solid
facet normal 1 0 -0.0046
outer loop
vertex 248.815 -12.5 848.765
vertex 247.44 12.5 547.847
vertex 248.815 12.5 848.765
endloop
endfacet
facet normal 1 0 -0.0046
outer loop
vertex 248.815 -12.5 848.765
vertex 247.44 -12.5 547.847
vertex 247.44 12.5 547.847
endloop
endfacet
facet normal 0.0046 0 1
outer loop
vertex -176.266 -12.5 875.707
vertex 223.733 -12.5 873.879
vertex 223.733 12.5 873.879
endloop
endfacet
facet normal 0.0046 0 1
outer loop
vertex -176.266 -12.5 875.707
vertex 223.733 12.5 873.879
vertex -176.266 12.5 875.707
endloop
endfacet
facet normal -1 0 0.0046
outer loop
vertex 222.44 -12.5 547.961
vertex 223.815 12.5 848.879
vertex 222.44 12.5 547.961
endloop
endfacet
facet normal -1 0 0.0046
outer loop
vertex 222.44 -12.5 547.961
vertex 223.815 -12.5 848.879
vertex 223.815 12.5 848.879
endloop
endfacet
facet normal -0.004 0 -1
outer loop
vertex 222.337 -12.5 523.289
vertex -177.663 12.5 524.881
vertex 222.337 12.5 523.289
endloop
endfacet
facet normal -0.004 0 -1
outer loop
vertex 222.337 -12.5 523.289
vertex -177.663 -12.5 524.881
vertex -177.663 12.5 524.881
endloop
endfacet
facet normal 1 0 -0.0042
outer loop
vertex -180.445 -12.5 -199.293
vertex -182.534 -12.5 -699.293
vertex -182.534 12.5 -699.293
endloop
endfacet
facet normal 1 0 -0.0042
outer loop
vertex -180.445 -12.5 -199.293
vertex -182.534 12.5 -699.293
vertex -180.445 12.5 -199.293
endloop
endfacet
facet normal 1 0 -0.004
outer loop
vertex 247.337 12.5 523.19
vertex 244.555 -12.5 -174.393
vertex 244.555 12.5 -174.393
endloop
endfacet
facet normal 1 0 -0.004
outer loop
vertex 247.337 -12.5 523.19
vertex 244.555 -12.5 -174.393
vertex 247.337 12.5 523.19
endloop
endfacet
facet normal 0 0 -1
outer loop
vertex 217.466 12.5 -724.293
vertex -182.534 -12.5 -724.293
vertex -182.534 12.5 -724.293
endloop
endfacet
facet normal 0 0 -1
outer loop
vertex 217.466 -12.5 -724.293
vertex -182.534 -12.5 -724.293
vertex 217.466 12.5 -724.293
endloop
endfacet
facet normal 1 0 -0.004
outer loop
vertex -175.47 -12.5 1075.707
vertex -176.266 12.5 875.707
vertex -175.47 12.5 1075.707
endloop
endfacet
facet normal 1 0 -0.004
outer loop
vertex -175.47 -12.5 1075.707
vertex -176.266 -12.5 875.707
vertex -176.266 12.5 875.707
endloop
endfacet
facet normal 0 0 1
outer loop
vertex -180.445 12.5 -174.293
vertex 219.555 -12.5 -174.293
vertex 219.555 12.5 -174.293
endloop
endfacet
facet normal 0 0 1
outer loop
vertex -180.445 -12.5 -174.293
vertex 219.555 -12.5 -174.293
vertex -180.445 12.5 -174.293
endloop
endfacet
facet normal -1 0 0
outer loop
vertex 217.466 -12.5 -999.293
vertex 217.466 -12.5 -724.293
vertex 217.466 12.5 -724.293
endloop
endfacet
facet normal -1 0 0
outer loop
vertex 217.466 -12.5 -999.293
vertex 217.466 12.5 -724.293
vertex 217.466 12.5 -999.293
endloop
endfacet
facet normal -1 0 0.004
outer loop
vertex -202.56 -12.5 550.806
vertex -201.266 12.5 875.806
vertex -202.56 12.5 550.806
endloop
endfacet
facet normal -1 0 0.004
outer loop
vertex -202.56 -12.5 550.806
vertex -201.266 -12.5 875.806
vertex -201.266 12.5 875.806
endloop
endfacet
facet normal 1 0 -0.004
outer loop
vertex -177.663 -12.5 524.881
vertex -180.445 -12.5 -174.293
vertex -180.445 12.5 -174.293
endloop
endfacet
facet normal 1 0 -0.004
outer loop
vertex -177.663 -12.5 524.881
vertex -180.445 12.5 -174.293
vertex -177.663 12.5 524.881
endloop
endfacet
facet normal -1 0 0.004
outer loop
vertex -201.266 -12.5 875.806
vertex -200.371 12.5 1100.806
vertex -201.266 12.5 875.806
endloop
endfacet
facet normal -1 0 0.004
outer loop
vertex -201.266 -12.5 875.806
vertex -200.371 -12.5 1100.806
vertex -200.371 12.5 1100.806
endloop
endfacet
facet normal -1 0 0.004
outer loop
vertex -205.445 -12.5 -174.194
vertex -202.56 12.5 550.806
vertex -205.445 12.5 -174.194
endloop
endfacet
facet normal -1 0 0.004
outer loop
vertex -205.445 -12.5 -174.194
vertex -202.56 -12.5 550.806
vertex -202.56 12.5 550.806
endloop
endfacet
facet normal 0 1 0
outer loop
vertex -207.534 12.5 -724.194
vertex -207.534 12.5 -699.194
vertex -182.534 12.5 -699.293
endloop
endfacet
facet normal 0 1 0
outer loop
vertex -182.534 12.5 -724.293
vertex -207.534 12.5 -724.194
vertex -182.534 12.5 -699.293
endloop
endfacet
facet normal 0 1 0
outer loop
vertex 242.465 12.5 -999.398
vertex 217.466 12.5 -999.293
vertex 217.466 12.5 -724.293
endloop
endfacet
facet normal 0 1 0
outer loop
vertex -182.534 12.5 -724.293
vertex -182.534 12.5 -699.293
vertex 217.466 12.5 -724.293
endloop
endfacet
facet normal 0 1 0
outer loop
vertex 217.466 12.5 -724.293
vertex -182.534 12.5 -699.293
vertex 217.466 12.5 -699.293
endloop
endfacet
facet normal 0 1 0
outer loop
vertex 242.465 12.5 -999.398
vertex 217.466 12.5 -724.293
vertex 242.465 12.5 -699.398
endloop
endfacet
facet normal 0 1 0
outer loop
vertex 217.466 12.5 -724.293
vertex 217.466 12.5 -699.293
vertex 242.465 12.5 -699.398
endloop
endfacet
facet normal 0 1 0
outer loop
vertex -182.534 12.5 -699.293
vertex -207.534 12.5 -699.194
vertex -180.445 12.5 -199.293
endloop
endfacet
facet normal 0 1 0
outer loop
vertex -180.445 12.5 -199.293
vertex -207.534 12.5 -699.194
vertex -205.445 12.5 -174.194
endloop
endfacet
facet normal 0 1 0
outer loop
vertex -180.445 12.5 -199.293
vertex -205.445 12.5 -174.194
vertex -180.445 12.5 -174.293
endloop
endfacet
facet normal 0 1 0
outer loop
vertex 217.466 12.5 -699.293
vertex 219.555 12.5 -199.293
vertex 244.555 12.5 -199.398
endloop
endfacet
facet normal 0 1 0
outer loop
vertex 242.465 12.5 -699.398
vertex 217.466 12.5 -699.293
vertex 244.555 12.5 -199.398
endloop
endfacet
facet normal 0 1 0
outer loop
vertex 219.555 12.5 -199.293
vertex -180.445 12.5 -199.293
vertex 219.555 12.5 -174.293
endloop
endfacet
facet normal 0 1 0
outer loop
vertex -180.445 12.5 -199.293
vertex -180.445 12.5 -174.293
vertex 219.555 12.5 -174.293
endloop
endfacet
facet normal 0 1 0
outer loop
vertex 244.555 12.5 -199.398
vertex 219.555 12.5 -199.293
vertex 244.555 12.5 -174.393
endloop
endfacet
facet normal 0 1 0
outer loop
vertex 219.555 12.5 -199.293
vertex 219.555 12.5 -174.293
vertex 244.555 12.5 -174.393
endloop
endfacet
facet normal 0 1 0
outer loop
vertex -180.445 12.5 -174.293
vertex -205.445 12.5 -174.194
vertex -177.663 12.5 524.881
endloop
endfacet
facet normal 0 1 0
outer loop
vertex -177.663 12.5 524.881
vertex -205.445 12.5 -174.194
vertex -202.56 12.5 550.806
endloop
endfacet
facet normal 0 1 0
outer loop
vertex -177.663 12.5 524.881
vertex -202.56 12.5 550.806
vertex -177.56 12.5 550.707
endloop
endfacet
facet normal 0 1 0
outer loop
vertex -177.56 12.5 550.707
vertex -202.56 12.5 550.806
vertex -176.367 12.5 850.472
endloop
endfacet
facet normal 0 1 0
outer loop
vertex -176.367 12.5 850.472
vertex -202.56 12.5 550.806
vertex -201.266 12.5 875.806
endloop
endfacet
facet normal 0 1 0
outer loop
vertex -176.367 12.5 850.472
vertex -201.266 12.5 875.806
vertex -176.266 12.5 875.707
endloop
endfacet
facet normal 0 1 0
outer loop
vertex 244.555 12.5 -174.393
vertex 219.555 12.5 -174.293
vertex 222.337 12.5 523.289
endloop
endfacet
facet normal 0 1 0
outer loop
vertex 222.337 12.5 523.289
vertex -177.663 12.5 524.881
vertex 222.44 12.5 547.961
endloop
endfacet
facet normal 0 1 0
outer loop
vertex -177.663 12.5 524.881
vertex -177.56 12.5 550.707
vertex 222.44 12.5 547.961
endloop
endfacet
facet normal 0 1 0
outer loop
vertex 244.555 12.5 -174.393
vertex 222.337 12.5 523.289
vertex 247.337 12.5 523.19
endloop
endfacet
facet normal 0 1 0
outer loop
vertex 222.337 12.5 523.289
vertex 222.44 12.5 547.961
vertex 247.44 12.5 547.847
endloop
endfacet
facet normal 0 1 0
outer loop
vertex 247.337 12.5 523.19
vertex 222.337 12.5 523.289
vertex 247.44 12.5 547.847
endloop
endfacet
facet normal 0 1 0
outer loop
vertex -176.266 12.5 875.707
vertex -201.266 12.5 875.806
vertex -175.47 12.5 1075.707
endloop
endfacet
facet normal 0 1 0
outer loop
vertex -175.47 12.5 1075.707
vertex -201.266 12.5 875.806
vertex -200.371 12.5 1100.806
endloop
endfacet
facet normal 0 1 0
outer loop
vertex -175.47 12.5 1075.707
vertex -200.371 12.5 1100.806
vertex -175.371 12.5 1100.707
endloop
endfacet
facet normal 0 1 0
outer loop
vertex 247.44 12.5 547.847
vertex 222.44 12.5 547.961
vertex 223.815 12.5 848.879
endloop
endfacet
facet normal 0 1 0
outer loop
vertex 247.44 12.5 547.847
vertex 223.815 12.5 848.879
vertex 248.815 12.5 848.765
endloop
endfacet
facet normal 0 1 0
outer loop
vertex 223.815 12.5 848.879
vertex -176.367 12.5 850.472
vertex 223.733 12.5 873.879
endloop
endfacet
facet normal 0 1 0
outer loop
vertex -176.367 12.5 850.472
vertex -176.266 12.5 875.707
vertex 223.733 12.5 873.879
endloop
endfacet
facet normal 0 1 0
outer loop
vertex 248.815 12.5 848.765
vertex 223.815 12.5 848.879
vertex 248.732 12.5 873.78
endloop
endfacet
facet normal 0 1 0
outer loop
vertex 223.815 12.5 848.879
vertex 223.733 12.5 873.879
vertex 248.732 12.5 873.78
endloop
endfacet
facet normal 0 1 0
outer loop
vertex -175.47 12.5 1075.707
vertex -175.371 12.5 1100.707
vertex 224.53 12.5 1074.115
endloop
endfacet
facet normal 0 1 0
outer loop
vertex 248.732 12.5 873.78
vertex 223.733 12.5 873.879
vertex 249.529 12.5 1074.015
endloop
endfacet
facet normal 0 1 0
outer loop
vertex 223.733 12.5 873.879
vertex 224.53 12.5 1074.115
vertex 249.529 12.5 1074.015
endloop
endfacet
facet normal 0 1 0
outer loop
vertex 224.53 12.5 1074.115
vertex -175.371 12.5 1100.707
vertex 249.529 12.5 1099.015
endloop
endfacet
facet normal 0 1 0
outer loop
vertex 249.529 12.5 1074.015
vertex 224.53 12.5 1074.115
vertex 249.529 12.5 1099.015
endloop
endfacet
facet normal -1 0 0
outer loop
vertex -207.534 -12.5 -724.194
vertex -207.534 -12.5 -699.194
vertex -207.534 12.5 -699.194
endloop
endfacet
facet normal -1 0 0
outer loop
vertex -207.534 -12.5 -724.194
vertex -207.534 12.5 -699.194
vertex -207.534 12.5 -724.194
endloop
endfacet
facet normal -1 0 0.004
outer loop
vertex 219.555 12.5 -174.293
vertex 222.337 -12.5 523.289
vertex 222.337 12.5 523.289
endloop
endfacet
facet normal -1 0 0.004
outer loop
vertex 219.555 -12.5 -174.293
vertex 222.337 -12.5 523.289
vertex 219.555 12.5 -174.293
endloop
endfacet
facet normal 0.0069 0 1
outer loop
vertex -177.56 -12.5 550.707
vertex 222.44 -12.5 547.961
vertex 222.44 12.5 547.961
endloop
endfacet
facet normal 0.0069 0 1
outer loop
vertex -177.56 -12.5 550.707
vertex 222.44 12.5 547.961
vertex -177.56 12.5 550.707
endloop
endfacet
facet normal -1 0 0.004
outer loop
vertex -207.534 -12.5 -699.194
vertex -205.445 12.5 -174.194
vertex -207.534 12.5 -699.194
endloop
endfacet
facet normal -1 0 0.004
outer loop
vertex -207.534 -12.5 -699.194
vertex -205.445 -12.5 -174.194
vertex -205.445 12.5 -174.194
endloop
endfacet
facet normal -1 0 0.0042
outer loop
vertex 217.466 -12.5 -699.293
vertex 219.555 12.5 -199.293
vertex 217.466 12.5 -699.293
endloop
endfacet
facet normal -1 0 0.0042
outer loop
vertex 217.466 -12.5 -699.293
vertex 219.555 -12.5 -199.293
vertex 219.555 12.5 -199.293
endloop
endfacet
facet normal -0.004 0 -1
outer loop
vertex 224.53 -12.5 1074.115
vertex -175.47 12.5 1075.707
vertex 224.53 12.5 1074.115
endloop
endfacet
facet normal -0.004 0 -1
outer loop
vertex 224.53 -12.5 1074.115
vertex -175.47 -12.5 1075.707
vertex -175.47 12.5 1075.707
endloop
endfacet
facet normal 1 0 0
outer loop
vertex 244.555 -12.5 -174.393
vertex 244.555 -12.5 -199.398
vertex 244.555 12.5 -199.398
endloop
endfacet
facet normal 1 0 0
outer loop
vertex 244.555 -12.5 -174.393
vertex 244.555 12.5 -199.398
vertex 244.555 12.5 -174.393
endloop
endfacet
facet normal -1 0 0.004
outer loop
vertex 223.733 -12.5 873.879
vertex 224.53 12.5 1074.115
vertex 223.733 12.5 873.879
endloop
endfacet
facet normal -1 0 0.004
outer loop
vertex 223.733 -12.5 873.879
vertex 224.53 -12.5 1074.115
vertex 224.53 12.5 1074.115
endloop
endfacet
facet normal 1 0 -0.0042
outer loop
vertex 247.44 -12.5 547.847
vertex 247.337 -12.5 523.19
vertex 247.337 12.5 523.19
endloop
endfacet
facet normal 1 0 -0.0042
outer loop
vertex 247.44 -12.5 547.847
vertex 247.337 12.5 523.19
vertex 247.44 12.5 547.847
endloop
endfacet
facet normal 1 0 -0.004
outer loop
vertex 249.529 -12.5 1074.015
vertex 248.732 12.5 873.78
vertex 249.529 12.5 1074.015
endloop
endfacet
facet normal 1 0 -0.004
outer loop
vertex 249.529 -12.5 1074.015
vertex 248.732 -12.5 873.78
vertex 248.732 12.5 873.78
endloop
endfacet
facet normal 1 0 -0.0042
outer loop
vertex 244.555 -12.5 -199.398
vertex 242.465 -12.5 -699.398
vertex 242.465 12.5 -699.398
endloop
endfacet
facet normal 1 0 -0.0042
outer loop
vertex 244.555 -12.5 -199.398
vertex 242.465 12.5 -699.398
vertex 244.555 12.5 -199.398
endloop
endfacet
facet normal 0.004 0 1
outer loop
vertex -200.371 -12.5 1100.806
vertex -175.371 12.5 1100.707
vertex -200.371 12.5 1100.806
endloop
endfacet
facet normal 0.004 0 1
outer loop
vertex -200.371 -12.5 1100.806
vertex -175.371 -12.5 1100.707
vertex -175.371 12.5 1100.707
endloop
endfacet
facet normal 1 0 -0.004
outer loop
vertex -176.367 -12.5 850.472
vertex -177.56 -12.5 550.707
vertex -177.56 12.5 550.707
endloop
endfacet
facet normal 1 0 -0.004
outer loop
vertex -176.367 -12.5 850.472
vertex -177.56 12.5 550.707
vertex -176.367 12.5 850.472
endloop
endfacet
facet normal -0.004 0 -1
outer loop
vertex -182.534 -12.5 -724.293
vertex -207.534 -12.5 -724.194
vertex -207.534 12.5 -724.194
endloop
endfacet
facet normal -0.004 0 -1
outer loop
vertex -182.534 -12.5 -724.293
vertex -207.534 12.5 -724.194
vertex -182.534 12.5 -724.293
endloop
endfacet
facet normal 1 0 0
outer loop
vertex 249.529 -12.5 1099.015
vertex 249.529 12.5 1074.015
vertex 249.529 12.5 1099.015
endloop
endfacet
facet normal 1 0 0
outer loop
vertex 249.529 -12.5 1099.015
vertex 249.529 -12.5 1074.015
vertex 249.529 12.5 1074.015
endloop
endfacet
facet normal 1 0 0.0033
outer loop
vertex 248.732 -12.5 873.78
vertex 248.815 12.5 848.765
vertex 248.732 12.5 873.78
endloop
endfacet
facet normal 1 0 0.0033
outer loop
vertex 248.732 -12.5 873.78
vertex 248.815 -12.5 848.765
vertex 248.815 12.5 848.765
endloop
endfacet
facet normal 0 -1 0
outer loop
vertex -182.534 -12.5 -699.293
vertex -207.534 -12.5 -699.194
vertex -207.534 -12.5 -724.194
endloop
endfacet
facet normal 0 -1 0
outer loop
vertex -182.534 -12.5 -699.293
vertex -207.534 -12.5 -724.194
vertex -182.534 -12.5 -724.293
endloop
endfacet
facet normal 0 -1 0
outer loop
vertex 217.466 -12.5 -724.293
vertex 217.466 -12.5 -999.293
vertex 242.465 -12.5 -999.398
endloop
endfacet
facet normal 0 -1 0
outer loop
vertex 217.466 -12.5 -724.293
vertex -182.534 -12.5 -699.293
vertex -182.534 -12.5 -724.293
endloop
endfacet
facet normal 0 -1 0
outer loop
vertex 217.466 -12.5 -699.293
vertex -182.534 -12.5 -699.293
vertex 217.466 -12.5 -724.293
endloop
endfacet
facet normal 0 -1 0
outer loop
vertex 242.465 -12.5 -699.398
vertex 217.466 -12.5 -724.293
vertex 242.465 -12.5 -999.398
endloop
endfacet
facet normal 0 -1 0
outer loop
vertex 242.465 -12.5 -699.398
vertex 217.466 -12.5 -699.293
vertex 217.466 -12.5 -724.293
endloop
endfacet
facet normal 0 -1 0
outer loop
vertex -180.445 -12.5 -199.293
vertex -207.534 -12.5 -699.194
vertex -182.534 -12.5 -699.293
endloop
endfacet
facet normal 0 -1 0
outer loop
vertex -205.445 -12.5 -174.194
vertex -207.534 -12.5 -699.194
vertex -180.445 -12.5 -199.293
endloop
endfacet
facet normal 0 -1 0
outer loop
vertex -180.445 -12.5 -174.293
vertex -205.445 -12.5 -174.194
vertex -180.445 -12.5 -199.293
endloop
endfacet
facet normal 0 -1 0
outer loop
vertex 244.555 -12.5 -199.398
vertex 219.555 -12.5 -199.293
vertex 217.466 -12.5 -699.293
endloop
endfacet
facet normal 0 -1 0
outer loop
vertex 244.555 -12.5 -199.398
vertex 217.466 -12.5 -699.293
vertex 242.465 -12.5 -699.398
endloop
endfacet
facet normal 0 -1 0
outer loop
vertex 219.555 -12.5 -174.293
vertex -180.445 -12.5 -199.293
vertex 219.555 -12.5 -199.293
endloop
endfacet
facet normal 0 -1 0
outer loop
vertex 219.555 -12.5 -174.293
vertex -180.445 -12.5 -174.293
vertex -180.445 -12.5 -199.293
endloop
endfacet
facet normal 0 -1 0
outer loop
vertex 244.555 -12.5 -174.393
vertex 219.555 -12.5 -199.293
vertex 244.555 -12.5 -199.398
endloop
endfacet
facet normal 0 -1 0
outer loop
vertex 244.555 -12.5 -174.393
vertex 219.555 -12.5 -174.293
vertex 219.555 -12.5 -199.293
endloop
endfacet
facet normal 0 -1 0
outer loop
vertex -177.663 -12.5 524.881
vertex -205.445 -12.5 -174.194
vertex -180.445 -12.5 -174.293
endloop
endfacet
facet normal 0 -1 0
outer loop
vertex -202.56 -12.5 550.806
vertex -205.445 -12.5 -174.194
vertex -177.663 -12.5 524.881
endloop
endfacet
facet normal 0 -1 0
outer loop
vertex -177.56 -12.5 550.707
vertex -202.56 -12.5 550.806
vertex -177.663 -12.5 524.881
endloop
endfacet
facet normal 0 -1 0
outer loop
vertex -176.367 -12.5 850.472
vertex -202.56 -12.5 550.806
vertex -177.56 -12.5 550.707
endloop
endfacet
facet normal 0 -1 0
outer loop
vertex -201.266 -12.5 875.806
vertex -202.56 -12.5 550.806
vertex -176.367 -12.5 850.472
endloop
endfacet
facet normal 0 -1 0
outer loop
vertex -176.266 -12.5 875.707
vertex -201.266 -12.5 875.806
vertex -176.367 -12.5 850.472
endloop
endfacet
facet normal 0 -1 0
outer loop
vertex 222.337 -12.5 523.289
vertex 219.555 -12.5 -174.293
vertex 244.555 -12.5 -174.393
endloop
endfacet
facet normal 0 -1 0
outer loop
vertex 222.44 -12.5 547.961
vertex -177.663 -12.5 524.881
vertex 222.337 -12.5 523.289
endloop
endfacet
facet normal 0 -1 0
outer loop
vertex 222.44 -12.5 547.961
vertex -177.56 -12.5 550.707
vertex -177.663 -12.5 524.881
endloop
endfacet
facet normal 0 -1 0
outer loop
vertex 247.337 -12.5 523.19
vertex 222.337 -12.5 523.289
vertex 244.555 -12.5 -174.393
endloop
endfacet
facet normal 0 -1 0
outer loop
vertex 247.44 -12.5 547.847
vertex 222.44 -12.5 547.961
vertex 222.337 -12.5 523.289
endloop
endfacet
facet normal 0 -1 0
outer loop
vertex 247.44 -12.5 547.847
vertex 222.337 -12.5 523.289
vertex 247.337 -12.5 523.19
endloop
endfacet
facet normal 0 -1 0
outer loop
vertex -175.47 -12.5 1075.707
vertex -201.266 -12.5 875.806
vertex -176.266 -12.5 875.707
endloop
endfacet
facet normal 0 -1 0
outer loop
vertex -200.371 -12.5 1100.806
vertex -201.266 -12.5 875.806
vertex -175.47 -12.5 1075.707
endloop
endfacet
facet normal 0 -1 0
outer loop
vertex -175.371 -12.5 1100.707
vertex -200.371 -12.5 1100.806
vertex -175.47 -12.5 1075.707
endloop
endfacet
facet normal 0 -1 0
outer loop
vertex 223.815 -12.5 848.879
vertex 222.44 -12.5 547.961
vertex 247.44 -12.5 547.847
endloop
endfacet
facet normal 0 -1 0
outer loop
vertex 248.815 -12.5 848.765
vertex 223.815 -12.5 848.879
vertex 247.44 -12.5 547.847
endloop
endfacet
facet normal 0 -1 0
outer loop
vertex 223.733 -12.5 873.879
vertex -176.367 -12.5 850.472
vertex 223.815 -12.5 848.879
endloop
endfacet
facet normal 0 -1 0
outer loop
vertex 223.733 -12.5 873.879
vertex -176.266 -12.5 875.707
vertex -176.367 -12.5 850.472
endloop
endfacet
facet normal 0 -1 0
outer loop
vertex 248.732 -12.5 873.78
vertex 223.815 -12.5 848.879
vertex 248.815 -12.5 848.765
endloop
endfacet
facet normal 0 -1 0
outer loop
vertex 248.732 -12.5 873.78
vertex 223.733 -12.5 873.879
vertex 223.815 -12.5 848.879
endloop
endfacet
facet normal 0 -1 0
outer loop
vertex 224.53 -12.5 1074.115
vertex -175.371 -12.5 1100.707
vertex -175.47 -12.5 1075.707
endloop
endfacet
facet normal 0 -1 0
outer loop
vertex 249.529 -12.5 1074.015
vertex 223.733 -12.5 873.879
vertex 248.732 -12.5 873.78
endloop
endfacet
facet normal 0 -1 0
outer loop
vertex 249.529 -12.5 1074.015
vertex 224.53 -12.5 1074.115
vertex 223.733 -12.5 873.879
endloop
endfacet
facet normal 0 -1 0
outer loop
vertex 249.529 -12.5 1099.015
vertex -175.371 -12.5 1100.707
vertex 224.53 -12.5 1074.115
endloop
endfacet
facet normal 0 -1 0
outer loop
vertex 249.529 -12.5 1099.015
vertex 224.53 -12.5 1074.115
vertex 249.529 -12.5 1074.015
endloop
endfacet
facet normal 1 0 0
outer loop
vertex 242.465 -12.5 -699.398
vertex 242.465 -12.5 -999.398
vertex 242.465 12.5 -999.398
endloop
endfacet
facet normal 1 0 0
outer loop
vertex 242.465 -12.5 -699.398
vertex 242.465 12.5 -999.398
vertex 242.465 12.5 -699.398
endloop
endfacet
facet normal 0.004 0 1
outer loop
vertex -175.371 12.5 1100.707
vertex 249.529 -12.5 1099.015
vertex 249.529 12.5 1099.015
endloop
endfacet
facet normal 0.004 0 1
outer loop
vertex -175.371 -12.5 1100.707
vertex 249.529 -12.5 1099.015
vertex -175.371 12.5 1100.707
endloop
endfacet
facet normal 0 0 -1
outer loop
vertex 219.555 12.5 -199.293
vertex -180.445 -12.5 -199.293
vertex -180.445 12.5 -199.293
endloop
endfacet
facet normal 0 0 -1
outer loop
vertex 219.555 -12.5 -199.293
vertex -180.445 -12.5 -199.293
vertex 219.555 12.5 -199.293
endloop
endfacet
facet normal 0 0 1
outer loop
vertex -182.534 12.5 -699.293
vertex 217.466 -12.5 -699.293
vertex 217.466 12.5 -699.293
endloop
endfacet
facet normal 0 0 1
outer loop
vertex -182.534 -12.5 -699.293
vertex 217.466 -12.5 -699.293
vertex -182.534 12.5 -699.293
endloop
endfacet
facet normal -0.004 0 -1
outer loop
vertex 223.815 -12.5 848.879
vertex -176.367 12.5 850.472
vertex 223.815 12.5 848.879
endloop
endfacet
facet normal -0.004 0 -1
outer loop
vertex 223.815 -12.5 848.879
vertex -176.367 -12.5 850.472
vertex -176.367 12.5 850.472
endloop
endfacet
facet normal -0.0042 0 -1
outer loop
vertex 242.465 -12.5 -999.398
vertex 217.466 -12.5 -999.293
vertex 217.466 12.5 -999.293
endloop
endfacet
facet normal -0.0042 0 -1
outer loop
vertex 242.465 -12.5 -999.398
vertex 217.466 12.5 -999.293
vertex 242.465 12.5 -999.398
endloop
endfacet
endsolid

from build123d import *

# Parameters (mm, degrees)
F1_DEPTH = 12.5


with BuildPart() as f1:
    # F0 (on Front) → F1 (new body, symmetric)
    with BuildSketch(Plane.XZ):
        Polygon((-205.444881, -174.193871), (-207.534229, -699.193871), (-207.534229, -724.193871), (-182.534427, -724.293363), (217.465573, -724.293363), (217.465573, -999.293363), (242.465355, -999.39783), (242.465355, -699.39783), (244.554703, -199.39783), (244.554722, -174.393082), (247.337235, 523.189536), (247.439954, 547.847293), (248.814853, 848.764804), (248.732482, 873.779536), (249.529363, 1074.015458), (249.529363, 1099.015458), (-175.370947, 1100.706637), (-200.370749, 1100.806129), (-201.266184, 875.806129), (-202.55959, 550.806129), align=None)
        Polygon((-182.534427, -699.293363), (-180.445079, -199.293363), (219.554921, -199.293363), (217.465573, -699.293363), align=None, mode=Mode.SUBTRACT)
        Polygon((219.554921, -174.293363), (-180.445079, -174.293363), (-177.662566, 524.88114), (222.337434, 523.289255), align=None, mode=Mode.SUBTRACT)
        Polygon((222.440212, 547.96088), (-177.559788, 550.706637), (-176.36681, 850.471637), (223.815114, 848.879028), align=None, mode=Mode.SUBTRACT)
        Polygon((223.73268, 873.879028), (-176.266382, 875.706637), (-175.470439, 1075.706835), (224.529561, 1074.11495), align=None, mode=Mode.SUBTRACT)
    extrude(amount=F1_DEPTH, both=True)


solid = f1.part
